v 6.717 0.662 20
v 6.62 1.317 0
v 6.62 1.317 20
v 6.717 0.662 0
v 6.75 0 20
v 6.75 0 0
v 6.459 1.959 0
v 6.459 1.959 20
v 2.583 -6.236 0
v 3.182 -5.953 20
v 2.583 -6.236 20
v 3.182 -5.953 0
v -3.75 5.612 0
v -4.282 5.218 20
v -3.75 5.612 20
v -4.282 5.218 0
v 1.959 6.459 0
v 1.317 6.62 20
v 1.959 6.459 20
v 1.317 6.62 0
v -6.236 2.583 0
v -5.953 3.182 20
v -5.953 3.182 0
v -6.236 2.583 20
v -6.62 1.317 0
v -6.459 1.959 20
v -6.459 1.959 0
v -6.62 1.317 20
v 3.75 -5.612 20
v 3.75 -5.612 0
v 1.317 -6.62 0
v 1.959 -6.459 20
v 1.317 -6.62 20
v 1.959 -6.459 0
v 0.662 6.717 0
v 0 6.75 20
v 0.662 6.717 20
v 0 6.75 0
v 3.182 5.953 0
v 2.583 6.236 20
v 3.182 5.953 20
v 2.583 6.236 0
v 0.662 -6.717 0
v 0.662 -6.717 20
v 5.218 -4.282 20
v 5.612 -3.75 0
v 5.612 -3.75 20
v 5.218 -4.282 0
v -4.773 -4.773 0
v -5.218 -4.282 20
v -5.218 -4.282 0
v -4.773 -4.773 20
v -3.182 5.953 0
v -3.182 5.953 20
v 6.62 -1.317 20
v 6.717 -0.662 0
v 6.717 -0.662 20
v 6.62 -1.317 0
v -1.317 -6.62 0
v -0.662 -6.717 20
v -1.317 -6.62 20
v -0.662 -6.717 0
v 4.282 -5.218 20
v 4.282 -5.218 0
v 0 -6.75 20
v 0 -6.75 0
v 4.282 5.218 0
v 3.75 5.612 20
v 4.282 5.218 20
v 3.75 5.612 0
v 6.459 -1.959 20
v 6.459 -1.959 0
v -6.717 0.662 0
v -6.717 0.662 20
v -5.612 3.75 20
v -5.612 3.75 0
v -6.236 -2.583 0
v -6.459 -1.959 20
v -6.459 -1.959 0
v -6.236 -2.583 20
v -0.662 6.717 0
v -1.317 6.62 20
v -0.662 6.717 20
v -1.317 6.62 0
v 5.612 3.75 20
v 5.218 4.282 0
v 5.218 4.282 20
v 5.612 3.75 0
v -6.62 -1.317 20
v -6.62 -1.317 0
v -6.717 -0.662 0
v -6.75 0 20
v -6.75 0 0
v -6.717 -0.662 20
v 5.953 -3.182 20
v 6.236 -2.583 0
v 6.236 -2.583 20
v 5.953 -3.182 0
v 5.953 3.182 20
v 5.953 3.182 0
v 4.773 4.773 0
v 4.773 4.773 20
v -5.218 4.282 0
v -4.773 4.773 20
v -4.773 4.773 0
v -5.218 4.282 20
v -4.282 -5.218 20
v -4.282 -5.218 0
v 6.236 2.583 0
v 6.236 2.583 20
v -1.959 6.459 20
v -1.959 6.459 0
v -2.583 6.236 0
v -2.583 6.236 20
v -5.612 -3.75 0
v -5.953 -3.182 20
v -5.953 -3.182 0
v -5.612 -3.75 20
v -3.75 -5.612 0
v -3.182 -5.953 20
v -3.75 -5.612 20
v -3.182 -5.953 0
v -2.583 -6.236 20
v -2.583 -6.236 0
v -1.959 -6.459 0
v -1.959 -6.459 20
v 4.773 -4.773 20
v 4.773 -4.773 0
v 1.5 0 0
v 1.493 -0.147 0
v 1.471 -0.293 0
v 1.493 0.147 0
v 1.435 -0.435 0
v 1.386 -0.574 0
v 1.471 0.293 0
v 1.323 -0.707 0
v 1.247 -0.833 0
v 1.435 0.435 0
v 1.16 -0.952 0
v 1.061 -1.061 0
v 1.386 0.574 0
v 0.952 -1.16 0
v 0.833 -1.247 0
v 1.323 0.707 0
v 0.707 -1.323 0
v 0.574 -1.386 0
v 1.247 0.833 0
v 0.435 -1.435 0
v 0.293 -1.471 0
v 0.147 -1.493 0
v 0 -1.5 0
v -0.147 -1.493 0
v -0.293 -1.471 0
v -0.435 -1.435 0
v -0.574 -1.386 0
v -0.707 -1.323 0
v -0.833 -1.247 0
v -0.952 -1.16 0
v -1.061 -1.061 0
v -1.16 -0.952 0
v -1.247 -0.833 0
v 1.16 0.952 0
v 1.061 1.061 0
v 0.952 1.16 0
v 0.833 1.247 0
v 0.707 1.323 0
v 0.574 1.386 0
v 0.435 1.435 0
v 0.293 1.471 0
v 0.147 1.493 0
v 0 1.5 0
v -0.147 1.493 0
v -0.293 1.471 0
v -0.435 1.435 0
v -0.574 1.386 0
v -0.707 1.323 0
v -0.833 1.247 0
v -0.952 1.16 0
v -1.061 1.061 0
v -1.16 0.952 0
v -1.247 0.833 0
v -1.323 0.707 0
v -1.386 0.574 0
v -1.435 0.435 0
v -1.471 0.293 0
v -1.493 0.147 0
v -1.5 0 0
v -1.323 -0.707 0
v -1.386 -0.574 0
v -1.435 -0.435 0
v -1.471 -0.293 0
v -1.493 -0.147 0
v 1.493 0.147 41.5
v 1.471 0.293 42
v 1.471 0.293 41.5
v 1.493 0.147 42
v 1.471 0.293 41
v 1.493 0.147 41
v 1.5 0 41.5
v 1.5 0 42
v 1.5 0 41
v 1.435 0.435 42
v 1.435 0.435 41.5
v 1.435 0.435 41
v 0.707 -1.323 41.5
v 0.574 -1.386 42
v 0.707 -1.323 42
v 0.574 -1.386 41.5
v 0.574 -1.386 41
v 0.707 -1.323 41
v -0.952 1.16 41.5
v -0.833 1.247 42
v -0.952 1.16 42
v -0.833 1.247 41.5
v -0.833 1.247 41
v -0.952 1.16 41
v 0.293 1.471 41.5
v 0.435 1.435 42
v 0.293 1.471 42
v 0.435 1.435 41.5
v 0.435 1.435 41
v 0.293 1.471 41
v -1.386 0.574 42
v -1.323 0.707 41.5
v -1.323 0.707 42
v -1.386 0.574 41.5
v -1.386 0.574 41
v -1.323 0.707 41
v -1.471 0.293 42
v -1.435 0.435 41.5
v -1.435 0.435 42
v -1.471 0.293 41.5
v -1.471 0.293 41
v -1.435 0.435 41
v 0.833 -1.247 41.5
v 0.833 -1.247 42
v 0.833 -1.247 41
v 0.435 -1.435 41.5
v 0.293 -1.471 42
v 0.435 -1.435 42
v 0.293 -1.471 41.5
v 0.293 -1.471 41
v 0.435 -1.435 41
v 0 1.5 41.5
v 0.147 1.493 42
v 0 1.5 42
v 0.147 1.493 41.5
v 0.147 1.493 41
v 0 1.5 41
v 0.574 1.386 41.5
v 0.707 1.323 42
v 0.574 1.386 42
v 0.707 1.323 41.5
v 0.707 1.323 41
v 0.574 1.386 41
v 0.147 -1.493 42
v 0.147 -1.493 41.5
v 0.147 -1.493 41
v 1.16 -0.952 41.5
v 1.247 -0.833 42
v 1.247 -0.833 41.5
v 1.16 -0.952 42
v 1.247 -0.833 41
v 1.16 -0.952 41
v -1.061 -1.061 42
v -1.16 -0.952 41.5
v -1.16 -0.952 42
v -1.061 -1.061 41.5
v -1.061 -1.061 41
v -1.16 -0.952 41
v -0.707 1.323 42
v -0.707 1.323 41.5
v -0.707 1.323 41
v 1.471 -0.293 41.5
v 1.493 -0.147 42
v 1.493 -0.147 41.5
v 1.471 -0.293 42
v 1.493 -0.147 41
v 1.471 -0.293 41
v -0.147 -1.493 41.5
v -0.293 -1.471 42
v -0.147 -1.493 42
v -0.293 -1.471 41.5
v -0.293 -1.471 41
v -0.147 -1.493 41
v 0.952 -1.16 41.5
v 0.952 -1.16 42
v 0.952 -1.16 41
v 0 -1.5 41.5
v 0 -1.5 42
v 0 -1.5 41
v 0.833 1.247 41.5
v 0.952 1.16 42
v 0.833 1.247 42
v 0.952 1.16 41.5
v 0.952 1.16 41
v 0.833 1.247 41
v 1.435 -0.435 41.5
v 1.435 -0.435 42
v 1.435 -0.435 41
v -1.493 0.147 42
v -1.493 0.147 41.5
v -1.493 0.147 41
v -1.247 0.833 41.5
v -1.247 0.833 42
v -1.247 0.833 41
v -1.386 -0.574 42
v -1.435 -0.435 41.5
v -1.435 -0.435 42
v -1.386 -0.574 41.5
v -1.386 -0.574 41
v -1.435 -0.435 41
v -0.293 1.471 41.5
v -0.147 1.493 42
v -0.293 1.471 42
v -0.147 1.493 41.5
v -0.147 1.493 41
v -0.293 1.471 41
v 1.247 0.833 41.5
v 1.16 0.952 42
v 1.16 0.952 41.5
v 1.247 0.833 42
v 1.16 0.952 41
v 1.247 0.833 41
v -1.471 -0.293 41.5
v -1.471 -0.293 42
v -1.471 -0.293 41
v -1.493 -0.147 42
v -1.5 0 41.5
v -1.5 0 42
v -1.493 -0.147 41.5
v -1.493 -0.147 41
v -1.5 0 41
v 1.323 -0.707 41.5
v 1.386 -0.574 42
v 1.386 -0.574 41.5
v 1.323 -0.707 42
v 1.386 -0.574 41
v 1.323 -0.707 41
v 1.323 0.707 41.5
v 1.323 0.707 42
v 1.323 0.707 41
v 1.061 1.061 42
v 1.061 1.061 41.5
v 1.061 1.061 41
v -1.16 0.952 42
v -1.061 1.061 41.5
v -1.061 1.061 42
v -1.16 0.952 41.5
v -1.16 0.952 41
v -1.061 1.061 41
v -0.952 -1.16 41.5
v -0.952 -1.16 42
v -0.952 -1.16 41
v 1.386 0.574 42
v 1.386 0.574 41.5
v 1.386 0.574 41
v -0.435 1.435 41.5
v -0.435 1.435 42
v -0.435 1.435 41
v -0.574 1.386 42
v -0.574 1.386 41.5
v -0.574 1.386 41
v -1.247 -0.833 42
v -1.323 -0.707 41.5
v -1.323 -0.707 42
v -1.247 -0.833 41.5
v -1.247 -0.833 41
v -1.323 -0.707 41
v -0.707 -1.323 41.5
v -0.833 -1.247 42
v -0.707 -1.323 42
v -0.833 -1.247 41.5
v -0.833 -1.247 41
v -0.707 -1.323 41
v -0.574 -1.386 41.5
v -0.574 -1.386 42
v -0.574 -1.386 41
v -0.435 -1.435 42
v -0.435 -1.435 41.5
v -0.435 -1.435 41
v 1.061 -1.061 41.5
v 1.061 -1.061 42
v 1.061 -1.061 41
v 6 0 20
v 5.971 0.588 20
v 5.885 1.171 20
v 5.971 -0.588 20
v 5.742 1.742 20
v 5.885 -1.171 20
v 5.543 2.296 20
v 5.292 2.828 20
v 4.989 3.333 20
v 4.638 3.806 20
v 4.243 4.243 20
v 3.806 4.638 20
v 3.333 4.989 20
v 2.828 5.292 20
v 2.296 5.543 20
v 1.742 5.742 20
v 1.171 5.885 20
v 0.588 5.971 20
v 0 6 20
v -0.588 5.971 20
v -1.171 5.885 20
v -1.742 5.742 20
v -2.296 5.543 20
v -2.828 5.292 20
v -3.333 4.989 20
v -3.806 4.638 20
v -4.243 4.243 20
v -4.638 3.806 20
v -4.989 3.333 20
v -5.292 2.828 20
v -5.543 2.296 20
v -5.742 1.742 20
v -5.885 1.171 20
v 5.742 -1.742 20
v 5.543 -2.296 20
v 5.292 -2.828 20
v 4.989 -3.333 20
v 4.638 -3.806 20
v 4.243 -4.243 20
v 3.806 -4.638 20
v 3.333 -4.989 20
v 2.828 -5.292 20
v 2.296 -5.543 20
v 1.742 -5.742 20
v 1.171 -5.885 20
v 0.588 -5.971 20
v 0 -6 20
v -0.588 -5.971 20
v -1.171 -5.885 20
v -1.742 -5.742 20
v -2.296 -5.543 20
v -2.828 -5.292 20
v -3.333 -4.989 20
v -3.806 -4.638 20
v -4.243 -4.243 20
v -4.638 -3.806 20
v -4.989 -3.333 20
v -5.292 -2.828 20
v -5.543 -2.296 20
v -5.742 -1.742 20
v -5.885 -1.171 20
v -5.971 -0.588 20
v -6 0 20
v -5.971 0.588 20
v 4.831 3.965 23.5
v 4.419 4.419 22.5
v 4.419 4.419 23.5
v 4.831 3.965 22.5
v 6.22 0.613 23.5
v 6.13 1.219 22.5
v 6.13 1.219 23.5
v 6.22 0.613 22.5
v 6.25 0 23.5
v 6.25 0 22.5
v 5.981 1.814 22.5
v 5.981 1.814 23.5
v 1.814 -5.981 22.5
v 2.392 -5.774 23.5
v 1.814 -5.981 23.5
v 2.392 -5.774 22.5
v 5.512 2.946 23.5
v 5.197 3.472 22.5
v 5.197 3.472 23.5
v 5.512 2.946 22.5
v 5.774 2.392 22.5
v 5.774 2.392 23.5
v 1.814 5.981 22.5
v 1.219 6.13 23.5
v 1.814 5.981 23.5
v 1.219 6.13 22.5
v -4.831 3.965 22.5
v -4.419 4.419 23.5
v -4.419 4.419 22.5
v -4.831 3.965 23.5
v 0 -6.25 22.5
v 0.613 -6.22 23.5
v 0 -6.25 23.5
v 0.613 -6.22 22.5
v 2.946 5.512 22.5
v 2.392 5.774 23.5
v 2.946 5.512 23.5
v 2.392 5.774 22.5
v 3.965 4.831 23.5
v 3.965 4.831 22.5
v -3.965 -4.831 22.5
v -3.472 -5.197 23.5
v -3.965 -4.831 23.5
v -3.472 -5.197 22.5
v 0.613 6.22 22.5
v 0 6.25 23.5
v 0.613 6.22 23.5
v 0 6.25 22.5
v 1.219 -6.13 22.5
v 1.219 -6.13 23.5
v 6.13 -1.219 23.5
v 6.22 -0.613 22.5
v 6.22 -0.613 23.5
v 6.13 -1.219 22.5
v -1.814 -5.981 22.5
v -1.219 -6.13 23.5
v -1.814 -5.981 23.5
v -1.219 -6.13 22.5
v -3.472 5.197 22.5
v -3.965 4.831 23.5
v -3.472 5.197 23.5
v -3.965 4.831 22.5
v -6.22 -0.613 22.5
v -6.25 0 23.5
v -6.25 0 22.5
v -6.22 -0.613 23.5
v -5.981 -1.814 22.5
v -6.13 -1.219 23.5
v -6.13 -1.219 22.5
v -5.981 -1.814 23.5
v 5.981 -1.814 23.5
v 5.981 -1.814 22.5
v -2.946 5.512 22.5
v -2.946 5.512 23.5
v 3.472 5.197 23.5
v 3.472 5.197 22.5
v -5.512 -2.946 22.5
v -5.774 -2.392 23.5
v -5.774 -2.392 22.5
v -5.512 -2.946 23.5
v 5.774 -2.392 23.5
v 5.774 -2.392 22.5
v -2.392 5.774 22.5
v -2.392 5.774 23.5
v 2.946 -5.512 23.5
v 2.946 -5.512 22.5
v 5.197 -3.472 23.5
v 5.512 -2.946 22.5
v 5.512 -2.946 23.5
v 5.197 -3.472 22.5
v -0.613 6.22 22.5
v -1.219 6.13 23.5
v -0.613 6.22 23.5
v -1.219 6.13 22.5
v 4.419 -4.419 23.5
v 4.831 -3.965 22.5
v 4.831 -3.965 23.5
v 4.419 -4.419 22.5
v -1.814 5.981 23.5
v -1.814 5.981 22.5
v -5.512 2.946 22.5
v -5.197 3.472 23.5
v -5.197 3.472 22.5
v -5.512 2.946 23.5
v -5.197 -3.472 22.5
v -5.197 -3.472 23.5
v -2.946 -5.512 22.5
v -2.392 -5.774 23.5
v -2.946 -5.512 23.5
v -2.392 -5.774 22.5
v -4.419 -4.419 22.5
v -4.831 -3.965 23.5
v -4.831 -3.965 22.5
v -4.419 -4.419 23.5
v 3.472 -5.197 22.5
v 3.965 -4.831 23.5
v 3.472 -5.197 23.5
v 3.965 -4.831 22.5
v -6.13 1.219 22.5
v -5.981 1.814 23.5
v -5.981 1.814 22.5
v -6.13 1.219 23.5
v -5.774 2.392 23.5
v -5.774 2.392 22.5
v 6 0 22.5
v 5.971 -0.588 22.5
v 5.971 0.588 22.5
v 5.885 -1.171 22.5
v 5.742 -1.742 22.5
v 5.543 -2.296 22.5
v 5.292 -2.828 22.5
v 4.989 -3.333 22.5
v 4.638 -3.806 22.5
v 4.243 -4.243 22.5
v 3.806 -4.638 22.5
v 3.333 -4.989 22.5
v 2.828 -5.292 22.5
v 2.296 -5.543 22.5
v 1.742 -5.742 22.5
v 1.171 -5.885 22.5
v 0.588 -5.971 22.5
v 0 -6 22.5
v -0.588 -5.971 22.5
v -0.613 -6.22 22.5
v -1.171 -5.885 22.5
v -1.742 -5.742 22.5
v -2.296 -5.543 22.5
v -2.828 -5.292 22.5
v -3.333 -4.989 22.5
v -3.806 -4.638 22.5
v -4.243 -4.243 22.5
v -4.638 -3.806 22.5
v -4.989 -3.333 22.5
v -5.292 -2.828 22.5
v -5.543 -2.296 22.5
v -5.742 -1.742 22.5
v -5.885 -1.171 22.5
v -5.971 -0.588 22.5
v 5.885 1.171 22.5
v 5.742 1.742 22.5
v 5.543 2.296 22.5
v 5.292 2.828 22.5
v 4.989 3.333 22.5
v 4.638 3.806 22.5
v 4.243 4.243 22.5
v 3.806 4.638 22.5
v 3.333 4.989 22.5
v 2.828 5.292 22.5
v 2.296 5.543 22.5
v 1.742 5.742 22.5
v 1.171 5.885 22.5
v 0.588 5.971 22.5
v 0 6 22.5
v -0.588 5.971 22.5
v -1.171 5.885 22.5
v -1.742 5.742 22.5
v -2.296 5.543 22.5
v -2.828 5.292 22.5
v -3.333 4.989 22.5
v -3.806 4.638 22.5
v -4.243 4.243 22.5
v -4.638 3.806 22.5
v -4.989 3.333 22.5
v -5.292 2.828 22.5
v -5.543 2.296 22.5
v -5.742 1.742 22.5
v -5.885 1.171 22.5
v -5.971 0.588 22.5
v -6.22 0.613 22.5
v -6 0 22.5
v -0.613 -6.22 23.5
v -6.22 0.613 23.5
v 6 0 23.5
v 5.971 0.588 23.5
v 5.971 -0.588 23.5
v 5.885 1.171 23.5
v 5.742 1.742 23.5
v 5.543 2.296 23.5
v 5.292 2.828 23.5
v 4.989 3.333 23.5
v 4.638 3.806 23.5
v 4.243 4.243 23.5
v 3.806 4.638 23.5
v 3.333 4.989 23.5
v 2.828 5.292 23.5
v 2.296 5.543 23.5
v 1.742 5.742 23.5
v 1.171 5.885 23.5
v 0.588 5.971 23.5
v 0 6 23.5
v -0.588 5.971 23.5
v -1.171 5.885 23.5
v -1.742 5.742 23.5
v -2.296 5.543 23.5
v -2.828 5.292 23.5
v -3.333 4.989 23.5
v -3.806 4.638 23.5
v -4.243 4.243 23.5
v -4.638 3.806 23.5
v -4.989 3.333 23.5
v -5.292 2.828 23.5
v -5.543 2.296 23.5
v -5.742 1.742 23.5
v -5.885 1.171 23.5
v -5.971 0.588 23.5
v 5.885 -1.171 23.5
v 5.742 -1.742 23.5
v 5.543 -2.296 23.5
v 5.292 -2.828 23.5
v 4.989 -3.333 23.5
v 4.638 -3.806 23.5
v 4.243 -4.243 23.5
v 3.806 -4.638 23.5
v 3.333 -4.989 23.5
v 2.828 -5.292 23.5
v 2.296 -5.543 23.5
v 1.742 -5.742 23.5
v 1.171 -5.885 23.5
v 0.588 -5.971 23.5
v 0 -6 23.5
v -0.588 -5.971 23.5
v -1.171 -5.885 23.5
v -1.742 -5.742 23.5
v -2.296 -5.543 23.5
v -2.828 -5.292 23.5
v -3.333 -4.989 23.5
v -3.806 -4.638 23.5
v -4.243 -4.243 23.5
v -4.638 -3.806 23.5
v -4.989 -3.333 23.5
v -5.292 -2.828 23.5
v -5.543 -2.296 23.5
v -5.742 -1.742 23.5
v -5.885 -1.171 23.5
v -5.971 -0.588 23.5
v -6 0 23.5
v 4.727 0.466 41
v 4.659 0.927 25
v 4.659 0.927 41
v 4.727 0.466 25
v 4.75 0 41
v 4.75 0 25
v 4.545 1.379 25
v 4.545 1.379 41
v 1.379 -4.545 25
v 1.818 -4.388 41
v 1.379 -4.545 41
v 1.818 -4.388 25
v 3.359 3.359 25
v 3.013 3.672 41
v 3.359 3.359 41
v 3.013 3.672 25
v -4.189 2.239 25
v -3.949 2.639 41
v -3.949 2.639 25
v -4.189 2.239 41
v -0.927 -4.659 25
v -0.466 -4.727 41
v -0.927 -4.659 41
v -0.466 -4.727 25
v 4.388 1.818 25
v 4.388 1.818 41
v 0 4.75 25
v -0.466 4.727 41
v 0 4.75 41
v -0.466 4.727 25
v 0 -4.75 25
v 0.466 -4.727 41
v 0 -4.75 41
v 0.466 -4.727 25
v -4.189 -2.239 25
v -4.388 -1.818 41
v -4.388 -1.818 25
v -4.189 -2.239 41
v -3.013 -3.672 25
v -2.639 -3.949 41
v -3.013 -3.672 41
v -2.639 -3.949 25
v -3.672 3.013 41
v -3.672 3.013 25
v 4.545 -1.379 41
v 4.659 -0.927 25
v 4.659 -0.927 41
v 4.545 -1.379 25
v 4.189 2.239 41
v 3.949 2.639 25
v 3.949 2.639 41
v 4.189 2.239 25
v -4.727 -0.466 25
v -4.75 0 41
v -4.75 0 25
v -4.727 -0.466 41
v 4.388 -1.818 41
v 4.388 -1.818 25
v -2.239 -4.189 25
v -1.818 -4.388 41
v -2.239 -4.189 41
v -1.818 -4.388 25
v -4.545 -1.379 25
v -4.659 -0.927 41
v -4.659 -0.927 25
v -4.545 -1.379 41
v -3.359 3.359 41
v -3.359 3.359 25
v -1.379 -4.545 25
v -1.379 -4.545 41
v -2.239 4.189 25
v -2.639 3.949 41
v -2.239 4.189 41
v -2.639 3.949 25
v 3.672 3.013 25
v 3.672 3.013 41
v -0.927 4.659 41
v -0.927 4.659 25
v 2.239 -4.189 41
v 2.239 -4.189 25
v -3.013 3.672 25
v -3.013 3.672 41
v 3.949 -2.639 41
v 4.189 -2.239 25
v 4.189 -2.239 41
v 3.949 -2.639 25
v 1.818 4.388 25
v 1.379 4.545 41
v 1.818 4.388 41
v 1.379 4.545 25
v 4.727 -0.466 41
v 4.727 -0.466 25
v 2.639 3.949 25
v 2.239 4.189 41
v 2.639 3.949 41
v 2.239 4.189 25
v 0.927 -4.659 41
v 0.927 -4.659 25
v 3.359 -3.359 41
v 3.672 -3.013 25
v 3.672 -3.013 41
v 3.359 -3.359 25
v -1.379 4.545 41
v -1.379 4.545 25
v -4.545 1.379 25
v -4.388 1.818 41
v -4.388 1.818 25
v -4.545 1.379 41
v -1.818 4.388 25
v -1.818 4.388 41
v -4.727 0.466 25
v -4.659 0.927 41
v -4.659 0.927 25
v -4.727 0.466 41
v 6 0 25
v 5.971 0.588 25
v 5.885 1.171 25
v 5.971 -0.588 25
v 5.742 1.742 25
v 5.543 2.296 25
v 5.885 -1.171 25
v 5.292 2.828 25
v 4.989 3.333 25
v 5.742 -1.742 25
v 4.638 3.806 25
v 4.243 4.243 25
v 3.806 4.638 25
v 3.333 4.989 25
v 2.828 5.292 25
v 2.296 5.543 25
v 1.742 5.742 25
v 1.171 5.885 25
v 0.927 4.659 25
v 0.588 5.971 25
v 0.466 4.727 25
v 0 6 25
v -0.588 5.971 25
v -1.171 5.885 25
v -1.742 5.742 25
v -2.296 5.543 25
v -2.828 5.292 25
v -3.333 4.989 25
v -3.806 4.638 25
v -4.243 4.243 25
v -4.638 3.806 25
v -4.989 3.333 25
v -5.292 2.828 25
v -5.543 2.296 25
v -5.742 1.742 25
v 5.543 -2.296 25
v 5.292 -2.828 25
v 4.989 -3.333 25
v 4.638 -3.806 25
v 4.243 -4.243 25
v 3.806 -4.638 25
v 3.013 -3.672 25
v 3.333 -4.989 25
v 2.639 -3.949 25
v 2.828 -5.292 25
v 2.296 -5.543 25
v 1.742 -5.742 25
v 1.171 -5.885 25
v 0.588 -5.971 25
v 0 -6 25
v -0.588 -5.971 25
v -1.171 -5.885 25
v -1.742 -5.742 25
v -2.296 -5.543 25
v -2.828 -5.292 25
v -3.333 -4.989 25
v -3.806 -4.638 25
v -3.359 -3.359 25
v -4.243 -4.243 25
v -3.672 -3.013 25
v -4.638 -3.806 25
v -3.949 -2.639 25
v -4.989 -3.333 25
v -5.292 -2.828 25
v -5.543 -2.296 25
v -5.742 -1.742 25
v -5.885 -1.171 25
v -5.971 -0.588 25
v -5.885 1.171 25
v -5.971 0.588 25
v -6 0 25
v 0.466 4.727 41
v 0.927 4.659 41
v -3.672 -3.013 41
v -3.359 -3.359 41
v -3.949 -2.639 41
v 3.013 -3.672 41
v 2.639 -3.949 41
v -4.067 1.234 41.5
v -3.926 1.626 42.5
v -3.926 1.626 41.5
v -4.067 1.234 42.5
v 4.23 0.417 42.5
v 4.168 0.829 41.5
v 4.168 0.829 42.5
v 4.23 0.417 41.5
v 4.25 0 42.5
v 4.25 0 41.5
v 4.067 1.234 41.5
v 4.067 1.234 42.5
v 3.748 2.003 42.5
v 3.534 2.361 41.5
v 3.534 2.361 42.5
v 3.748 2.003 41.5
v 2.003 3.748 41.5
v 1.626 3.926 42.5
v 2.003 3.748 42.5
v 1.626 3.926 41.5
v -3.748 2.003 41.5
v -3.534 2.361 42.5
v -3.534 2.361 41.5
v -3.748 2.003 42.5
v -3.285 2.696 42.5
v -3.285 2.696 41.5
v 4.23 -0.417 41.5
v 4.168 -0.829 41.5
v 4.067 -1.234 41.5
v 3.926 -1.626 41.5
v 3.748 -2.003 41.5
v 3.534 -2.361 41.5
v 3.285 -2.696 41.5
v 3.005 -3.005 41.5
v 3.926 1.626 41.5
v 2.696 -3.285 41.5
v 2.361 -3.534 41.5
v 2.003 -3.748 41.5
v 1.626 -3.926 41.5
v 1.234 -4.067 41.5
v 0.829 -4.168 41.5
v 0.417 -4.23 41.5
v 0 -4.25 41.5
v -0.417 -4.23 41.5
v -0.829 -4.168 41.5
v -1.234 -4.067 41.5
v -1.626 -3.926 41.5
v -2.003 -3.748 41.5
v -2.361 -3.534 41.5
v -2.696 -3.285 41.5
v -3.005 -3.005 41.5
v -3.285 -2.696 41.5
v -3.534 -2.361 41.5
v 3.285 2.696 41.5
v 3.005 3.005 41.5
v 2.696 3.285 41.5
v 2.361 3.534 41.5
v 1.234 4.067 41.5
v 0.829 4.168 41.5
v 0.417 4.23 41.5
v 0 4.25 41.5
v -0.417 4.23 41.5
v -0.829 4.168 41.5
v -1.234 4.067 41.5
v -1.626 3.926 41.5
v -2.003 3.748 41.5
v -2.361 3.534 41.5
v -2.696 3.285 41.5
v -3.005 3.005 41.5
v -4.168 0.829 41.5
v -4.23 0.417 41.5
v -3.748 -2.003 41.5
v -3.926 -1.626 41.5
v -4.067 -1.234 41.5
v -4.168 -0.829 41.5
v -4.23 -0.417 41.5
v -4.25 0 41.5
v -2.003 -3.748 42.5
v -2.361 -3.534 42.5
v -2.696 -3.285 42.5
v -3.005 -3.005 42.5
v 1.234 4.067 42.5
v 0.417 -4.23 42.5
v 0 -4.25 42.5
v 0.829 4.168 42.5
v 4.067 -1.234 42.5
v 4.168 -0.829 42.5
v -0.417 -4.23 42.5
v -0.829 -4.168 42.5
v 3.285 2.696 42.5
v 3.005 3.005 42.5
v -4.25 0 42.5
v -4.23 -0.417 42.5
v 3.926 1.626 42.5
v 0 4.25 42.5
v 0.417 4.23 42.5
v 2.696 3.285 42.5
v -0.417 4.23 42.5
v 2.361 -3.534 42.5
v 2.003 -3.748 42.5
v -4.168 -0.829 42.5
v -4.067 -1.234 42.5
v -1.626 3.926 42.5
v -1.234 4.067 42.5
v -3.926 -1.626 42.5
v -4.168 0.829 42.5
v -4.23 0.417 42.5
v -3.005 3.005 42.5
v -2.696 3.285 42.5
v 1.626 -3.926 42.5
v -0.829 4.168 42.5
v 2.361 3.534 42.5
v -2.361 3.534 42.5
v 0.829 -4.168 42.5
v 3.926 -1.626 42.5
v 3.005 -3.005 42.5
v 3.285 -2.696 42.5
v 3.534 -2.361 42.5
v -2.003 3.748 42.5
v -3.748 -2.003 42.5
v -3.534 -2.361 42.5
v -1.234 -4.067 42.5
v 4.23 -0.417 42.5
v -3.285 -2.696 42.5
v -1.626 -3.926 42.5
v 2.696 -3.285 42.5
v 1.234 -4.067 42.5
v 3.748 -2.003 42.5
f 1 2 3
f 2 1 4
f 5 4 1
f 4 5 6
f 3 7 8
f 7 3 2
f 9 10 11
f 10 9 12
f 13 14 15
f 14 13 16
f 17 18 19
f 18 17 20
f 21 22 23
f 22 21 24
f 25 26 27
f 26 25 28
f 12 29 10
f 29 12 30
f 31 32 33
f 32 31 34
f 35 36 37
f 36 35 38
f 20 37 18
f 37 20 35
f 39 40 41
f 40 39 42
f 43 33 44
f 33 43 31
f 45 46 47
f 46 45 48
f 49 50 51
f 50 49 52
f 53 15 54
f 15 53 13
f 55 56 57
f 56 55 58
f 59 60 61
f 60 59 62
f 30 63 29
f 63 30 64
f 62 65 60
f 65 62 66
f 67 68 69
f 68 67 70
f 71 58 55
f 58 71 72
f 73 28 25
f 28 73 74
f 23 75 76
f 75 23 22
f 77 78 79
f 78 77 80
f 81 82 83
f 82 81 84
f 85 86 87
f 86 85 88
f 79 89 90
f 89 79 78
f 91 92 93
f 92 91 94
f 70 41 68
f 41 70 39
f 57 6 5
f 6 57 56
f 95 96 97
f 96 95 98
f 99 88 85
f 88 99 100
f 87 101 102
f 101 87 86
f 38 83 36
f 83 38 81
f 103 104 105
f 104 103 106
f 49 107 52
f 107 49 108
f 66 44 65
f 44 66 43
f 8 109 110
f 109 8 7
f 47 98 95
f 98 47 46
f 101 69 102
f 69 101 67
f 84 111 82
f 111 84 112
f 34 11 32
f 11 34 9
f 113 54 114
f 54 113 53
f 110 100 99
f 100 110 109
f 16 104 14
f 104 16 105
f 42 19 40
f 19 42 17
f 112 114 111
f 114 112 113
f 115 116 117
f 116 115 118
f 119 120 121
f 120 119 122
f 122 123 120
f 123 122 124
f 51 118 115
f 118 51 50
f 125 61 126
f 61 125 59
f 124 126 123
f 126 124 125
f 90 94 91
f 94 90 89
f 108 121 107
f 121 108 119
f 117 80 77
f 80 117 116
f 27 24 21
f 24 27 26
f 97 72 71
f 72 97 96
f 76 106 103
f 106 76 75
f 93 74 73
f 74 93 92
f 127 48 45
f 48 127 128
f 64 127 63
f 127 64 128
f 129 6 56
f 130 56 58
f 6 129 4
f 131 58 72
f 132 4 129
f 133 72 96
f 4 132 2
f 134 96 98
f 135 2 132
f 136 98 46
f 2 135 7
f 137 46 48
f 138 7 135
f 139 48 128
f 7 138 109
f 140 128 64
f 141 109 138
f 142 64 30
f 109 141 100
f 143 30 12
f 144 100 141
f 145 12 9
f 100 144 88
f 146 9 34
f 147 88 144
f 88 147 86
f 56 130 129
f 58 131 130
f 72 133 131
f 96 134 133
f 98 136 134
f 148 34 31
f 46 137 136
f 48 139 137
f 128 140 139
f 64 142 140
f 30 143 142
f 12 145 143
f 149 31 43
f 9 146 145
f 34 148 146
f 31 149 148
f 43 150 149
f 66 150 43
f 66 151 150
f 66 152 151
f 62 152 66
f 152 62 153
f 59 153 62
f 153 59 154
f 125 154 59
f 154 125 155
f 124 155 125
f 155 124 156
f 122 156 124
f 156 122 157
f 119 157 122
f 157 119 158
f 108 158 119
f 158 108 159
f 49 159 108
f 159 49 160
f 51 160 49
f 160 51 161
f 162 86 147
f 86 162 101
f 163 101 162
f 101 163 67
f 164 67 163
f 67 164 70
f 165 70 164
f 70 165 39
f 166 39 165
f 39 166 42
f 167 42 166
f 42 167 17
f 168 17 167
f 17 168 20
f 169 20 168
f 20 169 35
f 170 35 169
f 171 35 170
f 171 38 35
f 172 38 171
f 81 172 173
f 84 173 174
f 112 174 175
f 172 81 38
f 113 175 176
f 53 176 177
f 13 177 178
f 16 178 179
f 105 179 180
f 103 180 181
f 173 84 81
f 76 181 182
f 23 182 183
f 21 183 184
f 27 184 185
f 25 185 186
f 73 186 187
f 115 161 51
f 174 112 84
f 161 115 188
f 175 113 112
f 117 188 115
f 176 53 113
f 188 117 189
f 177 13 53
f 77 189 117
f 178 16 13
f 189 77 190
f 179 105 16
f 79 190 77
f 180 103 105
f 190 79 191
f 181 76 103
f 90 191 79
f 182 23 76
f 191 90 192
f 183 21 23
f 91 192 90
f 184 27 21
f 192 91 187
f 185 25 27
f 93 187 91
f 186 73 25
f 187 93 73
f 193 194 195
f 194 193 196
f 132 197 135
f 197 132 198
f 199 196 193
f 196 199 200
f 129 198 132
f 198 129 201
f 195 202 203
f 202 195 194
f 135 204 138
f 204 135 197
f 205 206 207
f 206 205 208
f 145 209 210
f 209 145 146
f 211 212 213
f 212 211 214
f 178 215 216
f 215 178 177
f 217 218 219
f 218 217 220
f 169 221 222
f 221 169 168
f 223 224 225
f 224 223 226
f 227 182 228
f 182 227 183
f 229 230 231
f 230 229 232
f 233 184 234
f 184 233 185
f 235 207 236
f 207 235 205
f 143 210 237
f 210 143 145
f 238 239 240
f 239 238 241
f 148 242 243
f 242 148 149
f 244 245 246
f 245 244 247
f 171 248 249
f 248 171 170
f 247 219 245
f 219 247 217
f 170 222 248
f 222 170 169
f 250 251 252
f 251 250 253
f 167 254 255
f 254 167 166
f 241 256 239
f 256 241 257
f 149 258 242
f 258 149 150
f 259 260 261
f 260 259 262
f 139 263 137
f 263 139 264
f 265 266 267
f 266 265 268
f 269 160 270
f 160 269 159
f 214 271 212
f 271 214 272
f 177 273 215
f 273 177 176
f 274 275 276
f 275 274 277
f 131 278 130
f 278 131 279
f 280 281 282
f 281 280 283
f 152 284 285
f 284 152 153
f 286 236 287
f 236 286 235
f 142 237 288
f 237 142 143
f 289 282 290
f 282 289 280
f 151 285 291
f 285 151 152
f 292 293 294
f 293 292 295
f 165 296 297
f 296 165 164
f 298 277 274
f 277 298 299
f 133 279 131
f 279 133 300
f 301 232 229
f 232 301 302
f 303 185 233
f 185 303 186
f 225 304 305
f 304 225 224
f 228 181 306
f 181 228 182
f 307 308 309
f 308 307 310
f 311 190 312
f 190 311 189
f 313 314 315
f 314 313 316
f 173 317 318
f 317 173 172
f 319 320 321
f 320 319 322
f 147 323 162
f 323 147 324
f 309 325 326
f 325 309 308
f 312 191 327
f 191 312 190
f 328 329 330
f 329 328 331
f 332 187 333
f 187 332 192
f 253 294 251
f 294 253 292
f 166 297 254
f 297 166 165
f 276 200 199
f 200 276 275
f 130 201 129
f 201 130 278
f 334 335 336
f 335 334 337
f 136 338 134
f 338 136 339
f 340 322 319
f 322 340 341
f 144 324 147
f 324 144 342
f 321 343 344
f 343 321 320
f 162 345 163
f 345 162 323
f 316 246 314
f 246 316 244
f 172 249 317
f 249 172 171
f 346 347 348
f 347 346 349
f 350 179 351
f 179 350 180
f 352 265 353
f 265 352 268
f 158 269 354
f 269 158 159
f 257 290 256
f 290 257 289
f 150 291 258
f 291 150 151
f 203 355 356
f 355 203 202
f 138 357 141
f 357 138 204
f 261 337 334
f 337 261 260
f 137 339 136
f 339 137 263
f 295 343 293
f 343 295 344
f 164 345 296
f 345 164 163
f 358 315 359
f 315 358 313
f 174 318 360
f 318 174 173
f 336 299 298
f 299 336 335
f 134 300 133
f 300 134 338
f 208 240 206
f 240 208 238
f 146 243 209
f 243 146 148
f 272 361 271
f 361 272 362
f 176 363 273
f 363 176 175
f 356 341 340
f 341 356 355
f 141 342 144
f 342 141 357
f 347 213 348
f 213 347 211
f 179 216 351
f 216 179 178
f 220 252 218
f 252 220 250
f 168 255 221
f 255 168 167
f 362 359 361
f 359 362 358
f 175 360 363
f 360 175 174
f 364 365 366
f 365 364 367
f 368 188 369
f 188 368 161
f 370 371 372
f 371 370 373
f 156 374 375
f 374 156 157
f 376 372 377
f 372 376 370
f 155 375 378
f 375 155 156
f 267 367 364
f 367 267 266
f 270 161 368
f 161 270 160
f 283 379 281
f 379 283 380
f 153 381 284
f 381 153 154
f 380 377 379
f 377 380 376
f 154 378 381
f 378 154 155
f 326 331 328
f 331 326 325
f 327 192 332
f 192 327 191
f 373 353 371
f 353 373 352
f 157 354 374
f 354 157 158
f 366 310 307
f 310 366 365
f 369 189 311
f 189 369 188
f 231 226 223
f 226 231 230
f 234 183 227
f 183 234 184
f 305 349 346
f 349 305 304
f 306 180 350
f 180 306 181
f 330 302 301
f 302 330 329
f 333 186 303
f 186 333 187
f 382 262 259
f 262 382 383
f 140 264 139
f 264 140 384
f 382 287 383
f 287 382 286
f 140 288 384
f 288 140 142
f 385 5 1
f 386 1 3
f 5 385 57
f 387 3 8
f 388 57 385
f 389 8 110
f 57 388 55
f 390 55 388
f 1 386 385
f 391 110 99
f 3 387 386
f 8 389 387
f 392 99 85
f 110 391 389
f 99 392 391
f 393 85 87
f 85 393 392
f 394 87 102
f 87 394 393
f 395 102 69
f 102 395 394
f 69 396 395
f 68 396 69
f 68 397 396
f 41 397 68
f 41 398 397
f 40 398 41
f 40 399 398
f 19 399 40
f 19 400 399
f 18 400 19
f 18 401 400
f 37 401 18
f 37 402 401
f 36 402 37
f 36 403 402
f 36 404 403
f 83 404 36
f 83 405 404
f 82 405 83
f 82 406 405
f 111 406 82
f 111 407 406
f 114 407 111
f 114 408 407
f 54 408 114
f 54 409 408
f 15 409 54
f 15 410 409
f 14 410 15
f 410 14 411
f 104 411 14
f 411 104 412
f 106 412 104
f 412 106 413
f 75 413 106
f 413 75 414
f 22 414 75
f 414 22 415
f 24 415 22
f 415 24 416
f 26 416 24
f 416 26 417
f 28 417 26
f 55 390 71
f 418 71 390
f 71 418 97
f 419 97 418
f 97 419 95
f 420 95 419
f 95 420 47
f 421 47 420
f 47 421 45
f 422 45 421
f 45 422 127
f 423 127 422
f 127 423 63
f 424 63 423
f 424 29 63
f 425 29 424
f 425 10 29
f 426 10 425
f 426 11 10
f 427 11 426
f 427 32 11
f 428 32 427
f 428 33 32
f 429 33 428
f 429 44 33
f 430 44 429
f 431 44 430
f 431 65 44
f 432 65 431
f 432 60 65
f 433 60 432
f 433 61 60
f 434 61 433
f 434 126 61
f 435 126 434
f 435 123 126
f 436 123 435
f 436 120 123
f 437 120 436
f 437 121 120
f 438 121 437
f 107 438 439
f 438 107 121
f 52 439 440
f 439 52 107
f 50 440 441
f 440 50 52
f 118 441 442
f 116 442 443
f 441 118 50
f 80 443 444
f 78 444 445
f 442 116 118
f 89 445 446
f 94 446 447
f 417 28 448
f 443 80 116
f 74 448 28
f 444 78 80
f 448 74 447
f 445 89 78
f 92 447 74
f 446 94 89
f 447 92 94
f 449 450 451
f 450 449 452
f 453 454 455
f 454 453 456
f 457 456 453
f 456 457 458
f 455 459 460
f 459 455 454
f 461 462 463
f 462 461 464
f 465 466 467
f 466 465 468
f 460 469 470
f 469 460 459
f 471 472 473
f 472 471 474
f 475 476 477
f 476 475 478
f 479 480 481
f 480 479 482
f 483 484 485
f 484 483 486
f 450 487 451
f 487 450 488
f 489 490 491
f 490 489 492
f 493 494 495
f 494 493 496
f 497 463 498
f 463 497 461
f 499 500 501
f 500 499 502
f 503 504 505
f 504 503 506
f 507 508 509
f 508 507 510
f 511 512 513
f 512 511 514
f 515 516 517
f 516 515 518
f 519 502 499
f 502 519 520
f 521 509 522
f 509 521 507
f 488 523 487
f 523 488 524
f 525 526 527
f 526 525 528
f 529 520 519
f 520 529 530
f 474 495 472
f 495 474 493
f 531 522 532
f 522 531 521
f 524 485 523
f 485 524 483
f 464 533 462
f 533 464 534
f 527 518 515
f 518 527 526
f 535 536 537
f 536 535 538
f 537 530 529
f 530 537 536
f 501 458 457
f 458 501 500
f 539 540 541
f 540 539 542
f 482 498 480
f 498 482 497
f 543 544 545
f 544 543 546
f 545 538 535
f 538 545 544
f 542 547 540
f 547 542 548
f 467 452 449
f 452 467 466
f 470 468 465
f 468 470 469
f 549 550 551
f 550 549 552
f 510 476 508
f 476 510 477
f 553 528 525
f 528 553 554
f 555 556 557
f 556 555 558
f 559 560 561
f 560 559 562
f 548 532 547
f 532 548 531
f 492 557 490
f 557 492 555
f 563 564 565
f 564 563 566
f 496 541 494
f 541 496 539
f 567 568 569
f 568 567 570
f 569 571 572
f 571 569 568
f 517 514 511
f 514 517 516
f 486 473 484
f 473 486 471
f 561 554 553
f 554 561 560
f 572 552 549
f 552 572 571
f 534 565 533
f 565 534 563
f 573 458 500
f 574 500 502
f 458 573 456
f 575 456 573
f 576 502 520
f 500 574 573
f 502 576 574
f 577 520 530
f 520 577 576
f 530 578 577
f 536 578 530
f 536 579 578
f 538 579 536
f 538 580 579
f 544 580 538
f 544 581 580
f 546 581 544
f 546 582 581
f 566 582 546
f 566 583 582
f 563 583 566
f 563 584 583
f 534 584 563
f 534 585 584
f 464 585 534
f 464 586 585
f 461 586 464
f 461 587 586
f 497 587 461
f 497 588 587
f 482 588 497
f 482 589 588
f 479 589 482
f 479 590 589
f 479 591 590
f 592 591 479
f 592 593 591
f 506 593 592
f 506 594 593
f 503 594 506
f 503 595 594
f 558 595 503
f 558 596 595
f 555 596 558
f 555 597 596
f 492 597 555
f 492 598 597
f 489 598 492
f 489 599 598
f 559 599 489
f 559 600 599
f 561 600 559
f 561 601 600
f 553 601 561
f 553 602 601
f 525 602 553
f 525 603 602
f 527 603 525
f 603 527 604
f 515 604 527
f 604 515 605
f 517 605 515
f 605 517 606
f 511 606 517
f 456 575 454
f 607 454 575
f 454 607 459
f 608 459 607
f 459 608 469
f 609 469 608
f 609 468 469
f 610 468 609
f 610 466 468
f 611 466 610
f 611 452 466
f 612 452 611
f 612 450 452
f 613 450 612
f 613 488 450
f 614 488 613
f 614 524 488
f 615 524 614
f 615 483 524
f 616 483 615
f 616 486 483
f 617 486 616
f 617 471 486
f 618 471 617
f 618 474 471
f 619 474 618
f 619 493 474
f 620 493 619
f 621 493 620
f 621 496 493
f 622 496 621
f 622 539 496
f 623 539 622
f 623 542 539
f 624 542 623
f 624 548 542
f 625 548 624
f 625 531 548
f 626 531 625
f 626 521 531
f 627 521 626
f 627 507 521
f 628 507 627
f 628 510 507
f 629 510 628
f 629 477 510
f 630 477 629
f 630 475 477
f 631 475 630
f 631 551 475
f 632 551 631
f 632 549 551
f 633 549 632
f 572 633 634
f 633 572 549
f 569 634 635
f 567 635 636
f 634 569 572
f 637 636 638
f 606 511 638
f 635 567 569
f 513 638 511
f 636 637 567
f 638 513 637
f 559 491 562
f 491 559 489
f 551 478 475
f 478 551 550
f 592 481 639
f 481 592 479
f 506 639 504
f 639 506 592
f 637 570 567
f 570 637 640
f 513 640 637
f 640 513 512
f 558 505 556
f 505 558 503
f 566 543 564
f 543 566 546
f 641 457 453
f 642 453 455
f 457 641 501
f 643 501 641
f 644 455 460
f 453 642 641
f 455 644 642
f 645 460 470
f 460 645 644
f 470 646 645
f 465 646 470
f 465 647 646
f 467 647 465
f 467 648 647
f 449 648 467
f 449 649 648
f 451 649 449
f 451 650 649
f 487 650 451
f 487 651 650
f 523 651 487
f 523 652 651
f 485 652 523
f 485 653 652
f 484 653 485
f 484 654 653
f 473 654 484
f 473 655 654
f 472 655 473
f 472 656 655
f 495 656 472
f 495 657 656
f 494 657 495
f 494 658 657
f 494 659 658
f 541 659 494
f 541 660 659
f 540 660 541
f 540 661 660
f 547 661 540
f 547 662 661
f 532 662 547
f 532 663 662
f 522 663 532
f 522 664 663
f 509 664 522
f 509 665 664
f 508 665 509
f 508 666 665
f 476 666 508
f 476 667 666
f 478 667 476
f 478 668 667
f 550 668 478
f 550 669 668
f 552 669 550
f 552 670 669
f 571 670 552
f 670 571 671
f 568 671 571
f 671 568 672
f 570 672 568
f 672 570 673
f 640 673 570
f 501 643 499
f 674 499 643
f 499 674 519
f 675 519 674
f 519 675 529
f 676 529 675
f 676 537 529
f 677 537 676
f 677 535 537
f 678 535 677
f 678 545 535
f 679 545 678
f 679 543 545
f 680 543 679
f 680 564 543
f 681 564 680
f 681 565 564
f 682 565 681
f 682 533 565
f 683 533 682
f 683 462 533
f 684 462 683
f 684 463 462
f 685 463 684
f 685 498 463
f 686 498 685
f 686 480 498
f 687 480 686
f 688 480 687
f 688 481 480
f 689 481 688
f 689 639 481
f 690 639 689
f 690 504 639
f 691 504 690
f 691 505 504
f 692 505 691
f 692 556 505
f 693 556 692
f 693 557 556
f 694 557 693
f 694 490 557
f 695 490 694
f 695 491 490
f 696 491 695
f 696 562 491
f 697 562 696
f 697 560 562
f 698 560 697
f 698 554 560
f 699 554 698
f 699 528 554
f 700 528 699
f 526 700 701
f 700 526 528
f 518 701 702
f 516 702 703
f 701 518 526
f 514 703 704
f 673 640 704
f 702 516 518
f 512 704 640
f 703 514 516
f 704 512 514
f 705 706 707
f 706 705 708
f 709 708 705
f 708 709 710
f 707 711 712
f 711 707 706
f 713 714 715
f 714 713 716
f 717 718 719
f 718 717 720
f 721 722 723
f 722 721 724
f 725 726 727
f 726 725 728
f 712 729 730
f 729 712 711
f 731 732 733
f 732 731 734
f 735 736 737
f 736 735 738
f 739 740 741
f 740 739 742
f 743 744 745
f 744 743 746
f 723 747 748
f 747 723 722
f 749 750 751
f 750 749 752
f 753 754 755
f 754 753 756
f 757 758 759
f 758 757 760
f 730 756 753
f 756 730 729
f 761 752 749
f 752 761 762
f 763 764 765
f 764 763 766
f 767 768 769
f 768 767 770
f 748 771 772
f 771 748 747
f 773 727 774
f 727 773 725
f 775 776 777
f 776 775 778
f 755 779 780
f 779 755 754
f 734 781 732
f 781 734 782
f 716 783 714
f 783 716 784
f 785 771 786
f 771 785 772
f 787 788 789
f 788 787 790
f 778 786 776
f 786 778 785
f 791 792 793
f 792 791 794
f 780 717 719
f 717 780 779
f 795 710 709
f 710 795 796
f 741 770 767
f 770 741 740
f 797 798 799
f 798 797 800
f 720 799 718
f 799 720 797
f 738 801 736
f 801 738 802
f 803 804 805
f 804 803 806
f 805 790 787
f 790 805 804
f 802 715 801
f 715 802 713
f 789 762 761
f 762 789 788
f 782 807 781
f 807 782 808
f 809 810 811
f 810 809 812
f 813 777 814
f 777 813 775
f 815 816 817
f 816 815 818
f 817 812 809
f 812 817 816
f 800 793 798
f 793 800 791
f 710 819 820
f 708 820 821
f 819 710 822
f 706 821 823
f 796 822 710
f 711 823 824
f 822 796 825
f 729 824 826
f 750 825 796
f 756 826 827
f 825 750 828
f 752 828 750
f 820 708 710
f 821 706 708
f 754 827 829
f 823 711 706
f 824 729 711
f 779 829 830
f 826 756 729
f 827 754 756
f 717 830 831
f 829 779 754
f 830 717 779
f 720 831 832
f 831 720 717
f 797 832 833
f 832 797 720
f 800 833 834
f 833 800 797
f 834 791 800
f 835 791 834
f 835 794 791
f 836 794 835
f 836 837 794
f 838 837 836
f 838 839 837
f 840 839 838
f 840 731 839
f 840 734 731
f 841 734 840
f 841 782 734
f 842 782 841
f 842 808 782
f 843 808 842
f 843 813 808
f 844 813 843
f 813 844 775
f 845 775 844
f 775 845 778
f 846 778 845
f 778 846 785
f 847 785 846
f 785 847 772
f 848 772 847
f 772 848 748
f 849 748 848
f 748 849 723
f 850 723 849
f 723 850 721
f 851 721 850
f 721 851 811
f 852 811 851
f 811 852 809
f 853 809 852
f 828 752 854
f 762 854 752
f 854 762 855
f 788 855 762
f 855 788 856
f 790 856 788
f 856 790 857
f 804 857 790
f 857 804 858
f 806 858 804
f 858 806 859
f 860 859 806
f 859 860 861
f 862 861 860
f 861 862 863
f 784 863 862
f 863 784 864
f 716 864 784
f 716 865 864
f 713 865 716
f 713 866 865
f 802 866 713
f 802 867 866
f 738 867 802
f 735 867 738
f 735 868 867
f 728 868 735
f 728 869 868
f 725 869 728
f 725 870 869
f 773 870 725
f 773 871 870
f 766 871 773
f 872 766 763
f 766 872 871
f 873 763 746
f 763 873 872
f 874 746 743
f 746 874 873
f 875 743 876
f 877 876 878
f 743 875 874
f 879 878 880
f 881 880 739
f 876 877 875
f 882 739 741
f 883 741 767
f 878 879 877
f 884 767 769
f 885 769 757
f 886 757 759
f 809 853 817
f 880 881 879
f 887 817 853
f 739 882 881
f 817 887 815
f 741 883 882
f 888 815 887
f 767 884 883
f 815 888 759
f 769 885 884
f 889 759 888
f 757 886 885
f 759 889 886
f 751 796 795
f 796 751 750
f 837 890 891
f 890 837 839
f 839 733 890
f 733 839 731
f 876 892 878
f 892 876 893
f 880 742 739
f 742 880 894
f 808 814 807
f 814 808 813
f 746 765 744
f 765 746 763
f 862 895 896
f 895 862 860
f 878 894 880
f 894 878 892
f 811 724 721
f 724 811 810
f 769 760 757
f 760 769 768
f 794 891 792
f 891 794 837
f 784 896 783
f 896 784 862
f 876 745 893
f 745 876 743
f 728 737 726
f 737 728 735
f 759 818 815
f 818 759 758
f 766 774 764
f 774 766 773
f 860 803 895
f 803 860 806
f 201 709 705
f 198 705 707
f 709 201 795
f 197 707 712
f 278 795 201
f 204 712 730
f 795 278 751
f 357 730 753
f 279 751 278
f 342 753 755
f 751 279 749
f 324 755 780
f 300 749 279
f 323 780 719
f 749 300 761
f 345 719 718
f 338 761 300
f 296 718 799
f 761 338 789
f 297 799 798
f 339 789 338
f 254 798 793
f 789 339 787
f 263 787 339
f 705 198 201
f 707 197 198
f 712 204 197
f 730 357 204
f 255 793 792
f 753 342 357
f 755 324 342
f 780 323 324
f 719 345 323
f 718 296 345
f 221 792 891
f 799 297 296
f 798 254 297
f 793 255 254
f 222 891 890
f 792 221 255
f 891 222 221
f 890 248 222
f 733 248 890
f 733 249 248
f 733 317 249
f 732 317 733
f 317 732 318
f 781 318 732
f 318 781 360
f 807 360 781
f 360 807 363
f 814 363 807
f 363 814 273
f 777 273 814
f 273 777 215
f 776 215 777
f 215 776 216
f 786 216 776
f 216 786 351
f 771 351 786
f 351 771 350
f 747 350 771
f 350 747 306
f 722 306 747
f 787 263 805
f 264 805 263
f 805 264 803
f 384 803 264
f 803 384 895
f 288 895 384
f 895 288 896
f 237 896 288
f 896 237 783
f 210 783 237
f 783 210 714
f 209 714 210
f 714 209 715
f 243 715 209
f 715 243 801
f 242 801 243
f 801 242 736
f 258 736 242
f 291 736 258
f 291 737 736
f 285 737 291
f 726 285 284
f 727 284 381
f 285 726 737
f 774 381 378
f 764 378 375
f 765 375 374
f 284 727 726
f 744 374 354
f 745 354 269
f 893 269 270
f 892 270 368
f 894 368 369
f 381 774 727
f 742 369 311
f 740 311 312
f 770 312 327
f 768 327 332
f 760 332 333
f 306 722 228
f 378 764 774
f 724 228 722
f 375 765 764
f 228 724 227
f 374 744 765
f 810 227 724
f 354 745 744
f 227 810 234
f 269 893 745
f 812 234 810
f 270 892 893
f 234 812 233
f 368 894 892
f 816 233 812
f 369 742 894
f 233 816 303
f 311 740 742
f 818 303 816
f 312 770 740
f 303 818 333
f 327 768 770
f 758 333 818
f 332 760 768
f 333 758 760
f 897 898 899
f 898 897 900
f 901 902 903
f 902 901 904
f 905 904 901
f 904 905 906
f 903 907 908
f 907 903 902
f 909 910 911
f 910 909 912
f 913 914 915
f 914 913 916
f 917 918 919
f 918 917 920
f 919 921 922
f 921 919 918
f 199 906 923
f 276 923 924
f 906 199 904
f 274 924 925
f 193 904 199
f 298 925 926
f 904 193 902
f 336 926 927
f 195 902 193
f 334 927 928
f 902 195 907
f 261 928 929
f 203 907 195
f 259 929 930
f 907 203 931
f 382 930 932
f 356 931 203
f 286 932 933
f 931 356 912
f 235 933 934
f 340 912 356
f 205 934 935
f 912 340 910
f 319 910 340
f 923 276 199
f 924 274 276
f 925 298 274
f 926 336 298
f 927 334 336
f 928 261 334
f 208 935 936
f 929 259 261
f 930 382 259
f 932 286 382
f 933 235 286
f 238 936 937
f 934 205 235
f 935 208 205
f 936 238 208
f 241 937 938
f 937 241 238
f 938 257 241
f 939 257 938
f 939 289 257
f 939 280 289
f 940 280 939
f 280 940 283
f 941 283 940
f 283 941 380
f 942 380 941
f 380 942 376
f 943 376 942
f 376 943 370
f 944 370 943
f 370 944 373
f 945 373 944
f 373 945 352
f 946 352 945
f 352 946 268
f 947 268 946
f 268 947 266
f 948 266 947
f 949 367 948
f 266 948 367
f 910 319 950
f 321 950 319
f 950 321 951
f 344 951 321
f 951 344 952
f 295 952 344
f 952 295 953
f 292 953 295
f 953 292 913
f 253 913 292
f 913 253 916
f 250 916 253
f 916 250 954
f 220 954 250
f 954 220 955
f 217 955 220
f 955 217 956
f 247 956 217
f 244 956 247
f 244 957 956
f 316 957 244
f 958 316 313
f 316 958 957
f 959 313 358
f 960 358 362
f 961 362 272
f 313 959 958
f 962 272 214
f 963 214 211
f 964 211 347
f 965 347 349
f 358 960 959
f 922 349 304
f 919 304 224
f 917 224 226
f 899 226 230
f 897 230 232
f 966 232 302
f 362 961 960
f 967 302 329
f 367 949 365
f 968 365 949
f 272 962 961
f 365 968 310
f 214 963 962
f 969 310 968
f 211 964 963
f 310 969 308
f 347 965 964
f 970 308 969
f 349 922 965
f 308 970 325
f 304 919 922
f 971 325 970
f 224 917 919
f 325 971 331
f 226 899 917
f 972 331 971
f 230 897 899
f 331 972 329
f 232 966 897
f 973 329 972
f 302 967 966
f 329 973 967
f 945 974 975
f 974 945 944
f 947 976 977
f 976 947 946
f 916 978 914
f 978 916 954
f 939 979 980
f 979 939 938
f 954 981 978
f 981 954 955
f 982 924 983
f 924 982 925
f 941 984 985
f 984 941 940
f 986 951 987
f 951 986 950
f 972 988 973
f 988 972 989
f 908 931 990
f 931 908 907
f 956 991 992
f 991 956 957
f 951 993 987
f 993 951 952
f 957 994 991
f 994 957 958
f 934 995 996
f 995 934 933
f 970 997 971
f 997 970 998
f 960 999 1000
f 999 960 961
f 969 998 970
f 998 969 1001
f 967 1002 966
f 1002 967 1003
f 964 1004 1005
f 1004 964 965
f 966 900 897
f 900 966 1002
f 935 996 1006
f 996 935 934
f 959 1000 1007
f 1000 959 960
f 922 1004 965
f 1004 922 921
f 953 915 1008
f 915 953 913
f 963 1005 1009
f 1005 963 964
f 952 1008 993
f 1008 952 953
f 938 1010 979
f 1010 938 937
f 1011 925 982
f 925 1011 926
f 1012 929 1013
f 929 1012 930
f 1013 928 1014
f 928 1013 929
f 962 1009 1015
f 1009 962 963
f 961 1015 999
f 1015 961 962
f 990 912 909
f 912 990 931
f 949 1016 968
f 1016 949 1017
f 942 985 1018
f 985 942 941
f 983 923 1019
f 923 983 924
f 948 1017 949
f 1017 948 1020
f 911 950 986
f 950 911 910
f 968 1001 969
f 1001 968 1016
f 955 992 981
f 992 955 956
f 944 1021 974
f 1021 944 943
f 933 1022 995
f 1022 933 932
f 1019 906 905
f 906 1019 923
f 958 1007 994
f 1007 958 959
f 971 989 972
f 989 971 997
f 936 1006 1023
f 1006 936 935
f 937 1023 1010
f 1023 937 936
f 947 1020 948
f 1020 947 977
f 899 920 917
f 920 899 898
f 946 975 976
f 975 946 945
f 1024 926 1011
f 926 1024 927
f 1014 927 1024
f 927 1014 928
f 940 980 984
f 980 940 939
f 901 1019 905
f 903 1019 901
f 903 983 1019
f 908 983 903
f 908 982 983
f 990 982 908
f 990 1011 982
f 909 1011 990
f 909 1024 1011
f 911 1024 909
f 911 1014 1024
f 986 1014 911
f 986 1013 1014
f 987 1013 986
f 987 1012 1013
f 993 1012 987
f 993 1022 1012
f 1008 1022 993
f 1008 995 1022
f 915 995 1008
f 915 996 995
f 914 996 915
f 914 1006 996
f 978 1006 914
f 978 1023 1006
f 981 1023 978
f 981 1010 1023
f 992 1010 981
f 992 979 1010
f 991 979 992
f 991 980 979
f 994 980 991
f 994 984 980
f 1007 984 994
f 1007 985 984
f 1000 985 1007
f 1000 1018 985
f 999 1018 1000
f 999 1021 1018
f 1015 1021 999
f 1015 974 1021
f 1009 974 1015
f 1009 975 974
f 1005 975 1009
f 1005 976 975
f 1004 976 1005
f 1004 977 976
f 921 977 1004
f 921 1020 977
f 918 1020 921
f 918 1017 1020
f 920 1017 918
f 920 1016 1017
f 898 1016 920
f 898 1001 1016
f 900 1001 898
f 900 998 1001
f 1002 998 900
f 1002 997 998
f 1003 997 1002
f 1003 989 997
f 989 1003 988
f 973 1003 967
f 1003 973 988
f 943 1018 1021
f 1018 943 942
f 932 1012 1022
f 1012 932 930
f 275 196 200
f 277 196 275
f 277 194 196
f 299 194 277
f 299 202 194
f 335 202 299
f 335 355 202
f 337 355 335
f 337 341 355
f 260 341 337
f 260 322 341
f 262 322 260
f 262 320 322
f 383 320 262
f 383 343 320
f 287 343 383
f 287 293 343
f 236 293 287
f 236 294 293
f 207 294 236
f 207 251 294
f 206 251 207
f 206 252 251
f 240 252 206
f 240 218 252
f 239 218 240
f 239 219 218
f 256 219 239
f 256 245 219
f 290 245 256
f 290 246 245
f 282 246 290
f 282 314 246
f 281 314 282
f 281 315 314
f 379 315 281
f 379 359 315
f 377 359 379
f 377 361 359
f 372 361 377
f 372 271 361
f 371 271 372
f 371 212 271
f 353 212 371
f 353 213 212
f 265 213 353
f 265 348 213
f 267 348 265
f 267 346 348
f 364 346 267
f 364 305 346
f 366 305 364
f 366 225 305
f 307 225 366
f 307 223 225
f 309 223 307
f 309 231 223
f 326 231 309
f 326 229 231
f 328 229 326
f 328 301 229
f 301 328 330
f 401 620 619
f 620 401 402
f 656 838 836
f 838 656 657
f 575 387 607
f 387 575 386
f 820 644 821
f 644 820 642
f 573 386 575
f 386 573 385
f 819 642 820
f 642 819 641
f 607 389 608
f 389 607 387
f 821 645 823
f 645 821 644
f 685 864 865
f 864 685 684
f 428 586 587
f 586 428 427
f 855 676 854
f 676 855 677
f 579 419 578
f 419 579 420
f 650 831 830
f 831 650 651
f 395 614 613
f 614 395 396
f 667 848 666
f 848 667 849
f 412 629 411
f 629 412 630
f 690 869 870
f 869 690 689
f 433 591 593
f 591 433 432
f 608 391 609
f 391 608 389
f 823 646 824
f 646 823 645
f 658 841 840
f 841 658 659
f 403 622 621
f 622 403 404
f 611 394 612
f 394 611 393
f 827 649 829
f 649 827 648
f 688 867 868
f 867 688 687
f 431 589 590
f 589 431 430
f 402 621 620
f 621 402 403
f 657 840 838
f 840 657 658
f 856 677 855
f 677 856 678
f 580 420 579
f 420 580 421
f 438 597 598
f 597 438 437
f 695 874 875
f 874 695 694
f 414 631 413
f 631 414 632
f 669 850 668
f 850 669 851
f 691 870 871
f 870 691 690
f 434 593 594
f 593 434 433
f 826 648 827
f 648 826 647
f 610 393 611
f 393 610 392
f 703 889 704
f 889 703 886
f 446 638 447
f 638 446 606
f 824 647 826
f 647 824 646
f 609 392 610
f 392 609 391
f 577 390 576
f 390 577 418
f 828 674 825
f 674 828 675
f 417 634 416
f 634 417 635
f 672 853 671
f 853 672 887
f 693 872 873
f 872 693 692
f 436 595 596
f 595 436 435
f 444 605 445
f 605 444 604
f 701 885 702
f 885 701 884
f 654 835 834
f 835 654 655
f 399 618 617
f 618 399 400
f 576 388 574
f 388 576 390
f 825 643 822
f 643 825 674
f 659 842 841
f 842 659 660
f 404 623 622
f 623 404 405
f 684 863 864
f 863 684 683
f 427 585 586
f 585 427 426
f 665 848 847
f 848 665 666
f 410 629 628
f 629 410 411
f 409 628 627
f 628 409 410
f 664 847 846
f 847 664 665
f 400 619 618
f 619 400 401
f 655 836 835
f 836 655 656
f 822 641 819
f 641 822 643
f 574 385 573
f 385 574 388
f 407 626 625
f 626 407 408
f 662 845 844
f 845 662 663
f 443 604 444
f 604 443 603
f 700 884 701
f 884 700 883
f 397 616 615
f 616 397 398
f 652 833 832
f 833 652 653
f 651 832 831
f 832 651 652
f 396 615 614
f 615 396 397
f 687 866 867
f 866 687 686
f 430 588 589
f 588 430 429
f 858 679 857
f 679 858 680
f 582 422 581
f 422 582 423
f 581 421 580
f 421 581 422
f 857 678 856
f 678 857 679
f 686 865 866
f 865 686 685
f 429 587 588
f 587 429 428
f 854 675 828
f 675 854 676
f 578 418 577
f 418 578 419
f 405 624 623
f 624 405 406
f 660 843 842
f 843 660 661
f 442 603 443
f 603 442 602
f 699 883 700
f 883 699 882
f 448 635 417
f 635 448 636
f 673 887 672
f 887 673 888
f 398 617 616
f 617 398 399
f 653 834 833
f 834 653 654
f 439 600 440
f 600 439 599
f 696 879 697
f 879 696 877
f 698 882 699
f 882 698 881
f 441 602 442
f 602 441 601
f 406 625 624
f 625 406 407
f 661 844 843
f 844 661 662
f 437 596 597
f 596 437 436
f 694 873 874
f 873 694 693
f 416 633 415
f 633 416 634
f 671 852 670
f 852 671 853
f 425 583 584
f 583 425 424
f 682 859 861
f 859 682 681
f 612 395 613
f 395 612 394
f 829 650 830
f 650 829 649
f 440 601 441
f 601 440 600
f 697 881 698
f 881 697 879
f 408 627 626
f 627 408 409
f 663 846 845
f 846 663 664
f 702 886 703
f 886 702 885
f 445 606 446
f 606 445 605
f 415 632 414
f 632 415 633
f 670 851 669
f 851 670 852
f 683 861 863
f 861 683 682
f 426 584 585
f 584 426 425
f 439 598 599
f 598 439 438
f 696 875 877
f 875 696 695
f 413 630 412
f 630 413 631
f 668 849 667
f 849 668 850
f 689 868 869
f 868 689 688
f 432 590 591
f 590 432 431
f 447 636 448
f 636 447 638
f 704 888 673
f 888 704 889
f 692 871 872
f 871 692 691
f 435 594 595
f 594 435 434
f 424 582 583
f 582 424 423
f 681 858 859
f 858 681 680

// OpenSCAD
// Hose barb reducer - a straight reduction spool with a through bore that carries two stacked
// barbs for one tubing size into two stacked barbs for a smaller size, with a collar near the
// transition. NOVEL general part (a generic reducer, not any one labware item).
//

t1   = 8;
t2   = 5;
bore = 3;
L    = 41;
g    = 1.5;

$fn = 64;

barb_d1 = 7.5 + 2 * g;
barb_d2 = 6.5;

module barb(h, d) {
    d_t = d + 2 * g;
    difference() {
        union() {
            cylinder(h = h, d = d_t);
            translate([0, 0, d_t - 1]) cylinder(h = 1, d = d + 2);   // shoulder
        }
        translate([0, 0, -1]) cylinder(h = h + 2, d = bore);
    }
}

difference() {
    union() {
        for (z = [0, 10]) translate([0, 0, z]) barb(h = 10, d = barb_d1);      // upper size
        translate([0, 0, 20]) cylinder(h = 5, d = 12);                         // collar
        for (z = [25, 33]) translate([0, 0, z]) barb(h = 8, d = barb_d2);      // lower size
    }
    translate([0, 0, -1]) cylinder(h = L + 2, d = bore);
}
